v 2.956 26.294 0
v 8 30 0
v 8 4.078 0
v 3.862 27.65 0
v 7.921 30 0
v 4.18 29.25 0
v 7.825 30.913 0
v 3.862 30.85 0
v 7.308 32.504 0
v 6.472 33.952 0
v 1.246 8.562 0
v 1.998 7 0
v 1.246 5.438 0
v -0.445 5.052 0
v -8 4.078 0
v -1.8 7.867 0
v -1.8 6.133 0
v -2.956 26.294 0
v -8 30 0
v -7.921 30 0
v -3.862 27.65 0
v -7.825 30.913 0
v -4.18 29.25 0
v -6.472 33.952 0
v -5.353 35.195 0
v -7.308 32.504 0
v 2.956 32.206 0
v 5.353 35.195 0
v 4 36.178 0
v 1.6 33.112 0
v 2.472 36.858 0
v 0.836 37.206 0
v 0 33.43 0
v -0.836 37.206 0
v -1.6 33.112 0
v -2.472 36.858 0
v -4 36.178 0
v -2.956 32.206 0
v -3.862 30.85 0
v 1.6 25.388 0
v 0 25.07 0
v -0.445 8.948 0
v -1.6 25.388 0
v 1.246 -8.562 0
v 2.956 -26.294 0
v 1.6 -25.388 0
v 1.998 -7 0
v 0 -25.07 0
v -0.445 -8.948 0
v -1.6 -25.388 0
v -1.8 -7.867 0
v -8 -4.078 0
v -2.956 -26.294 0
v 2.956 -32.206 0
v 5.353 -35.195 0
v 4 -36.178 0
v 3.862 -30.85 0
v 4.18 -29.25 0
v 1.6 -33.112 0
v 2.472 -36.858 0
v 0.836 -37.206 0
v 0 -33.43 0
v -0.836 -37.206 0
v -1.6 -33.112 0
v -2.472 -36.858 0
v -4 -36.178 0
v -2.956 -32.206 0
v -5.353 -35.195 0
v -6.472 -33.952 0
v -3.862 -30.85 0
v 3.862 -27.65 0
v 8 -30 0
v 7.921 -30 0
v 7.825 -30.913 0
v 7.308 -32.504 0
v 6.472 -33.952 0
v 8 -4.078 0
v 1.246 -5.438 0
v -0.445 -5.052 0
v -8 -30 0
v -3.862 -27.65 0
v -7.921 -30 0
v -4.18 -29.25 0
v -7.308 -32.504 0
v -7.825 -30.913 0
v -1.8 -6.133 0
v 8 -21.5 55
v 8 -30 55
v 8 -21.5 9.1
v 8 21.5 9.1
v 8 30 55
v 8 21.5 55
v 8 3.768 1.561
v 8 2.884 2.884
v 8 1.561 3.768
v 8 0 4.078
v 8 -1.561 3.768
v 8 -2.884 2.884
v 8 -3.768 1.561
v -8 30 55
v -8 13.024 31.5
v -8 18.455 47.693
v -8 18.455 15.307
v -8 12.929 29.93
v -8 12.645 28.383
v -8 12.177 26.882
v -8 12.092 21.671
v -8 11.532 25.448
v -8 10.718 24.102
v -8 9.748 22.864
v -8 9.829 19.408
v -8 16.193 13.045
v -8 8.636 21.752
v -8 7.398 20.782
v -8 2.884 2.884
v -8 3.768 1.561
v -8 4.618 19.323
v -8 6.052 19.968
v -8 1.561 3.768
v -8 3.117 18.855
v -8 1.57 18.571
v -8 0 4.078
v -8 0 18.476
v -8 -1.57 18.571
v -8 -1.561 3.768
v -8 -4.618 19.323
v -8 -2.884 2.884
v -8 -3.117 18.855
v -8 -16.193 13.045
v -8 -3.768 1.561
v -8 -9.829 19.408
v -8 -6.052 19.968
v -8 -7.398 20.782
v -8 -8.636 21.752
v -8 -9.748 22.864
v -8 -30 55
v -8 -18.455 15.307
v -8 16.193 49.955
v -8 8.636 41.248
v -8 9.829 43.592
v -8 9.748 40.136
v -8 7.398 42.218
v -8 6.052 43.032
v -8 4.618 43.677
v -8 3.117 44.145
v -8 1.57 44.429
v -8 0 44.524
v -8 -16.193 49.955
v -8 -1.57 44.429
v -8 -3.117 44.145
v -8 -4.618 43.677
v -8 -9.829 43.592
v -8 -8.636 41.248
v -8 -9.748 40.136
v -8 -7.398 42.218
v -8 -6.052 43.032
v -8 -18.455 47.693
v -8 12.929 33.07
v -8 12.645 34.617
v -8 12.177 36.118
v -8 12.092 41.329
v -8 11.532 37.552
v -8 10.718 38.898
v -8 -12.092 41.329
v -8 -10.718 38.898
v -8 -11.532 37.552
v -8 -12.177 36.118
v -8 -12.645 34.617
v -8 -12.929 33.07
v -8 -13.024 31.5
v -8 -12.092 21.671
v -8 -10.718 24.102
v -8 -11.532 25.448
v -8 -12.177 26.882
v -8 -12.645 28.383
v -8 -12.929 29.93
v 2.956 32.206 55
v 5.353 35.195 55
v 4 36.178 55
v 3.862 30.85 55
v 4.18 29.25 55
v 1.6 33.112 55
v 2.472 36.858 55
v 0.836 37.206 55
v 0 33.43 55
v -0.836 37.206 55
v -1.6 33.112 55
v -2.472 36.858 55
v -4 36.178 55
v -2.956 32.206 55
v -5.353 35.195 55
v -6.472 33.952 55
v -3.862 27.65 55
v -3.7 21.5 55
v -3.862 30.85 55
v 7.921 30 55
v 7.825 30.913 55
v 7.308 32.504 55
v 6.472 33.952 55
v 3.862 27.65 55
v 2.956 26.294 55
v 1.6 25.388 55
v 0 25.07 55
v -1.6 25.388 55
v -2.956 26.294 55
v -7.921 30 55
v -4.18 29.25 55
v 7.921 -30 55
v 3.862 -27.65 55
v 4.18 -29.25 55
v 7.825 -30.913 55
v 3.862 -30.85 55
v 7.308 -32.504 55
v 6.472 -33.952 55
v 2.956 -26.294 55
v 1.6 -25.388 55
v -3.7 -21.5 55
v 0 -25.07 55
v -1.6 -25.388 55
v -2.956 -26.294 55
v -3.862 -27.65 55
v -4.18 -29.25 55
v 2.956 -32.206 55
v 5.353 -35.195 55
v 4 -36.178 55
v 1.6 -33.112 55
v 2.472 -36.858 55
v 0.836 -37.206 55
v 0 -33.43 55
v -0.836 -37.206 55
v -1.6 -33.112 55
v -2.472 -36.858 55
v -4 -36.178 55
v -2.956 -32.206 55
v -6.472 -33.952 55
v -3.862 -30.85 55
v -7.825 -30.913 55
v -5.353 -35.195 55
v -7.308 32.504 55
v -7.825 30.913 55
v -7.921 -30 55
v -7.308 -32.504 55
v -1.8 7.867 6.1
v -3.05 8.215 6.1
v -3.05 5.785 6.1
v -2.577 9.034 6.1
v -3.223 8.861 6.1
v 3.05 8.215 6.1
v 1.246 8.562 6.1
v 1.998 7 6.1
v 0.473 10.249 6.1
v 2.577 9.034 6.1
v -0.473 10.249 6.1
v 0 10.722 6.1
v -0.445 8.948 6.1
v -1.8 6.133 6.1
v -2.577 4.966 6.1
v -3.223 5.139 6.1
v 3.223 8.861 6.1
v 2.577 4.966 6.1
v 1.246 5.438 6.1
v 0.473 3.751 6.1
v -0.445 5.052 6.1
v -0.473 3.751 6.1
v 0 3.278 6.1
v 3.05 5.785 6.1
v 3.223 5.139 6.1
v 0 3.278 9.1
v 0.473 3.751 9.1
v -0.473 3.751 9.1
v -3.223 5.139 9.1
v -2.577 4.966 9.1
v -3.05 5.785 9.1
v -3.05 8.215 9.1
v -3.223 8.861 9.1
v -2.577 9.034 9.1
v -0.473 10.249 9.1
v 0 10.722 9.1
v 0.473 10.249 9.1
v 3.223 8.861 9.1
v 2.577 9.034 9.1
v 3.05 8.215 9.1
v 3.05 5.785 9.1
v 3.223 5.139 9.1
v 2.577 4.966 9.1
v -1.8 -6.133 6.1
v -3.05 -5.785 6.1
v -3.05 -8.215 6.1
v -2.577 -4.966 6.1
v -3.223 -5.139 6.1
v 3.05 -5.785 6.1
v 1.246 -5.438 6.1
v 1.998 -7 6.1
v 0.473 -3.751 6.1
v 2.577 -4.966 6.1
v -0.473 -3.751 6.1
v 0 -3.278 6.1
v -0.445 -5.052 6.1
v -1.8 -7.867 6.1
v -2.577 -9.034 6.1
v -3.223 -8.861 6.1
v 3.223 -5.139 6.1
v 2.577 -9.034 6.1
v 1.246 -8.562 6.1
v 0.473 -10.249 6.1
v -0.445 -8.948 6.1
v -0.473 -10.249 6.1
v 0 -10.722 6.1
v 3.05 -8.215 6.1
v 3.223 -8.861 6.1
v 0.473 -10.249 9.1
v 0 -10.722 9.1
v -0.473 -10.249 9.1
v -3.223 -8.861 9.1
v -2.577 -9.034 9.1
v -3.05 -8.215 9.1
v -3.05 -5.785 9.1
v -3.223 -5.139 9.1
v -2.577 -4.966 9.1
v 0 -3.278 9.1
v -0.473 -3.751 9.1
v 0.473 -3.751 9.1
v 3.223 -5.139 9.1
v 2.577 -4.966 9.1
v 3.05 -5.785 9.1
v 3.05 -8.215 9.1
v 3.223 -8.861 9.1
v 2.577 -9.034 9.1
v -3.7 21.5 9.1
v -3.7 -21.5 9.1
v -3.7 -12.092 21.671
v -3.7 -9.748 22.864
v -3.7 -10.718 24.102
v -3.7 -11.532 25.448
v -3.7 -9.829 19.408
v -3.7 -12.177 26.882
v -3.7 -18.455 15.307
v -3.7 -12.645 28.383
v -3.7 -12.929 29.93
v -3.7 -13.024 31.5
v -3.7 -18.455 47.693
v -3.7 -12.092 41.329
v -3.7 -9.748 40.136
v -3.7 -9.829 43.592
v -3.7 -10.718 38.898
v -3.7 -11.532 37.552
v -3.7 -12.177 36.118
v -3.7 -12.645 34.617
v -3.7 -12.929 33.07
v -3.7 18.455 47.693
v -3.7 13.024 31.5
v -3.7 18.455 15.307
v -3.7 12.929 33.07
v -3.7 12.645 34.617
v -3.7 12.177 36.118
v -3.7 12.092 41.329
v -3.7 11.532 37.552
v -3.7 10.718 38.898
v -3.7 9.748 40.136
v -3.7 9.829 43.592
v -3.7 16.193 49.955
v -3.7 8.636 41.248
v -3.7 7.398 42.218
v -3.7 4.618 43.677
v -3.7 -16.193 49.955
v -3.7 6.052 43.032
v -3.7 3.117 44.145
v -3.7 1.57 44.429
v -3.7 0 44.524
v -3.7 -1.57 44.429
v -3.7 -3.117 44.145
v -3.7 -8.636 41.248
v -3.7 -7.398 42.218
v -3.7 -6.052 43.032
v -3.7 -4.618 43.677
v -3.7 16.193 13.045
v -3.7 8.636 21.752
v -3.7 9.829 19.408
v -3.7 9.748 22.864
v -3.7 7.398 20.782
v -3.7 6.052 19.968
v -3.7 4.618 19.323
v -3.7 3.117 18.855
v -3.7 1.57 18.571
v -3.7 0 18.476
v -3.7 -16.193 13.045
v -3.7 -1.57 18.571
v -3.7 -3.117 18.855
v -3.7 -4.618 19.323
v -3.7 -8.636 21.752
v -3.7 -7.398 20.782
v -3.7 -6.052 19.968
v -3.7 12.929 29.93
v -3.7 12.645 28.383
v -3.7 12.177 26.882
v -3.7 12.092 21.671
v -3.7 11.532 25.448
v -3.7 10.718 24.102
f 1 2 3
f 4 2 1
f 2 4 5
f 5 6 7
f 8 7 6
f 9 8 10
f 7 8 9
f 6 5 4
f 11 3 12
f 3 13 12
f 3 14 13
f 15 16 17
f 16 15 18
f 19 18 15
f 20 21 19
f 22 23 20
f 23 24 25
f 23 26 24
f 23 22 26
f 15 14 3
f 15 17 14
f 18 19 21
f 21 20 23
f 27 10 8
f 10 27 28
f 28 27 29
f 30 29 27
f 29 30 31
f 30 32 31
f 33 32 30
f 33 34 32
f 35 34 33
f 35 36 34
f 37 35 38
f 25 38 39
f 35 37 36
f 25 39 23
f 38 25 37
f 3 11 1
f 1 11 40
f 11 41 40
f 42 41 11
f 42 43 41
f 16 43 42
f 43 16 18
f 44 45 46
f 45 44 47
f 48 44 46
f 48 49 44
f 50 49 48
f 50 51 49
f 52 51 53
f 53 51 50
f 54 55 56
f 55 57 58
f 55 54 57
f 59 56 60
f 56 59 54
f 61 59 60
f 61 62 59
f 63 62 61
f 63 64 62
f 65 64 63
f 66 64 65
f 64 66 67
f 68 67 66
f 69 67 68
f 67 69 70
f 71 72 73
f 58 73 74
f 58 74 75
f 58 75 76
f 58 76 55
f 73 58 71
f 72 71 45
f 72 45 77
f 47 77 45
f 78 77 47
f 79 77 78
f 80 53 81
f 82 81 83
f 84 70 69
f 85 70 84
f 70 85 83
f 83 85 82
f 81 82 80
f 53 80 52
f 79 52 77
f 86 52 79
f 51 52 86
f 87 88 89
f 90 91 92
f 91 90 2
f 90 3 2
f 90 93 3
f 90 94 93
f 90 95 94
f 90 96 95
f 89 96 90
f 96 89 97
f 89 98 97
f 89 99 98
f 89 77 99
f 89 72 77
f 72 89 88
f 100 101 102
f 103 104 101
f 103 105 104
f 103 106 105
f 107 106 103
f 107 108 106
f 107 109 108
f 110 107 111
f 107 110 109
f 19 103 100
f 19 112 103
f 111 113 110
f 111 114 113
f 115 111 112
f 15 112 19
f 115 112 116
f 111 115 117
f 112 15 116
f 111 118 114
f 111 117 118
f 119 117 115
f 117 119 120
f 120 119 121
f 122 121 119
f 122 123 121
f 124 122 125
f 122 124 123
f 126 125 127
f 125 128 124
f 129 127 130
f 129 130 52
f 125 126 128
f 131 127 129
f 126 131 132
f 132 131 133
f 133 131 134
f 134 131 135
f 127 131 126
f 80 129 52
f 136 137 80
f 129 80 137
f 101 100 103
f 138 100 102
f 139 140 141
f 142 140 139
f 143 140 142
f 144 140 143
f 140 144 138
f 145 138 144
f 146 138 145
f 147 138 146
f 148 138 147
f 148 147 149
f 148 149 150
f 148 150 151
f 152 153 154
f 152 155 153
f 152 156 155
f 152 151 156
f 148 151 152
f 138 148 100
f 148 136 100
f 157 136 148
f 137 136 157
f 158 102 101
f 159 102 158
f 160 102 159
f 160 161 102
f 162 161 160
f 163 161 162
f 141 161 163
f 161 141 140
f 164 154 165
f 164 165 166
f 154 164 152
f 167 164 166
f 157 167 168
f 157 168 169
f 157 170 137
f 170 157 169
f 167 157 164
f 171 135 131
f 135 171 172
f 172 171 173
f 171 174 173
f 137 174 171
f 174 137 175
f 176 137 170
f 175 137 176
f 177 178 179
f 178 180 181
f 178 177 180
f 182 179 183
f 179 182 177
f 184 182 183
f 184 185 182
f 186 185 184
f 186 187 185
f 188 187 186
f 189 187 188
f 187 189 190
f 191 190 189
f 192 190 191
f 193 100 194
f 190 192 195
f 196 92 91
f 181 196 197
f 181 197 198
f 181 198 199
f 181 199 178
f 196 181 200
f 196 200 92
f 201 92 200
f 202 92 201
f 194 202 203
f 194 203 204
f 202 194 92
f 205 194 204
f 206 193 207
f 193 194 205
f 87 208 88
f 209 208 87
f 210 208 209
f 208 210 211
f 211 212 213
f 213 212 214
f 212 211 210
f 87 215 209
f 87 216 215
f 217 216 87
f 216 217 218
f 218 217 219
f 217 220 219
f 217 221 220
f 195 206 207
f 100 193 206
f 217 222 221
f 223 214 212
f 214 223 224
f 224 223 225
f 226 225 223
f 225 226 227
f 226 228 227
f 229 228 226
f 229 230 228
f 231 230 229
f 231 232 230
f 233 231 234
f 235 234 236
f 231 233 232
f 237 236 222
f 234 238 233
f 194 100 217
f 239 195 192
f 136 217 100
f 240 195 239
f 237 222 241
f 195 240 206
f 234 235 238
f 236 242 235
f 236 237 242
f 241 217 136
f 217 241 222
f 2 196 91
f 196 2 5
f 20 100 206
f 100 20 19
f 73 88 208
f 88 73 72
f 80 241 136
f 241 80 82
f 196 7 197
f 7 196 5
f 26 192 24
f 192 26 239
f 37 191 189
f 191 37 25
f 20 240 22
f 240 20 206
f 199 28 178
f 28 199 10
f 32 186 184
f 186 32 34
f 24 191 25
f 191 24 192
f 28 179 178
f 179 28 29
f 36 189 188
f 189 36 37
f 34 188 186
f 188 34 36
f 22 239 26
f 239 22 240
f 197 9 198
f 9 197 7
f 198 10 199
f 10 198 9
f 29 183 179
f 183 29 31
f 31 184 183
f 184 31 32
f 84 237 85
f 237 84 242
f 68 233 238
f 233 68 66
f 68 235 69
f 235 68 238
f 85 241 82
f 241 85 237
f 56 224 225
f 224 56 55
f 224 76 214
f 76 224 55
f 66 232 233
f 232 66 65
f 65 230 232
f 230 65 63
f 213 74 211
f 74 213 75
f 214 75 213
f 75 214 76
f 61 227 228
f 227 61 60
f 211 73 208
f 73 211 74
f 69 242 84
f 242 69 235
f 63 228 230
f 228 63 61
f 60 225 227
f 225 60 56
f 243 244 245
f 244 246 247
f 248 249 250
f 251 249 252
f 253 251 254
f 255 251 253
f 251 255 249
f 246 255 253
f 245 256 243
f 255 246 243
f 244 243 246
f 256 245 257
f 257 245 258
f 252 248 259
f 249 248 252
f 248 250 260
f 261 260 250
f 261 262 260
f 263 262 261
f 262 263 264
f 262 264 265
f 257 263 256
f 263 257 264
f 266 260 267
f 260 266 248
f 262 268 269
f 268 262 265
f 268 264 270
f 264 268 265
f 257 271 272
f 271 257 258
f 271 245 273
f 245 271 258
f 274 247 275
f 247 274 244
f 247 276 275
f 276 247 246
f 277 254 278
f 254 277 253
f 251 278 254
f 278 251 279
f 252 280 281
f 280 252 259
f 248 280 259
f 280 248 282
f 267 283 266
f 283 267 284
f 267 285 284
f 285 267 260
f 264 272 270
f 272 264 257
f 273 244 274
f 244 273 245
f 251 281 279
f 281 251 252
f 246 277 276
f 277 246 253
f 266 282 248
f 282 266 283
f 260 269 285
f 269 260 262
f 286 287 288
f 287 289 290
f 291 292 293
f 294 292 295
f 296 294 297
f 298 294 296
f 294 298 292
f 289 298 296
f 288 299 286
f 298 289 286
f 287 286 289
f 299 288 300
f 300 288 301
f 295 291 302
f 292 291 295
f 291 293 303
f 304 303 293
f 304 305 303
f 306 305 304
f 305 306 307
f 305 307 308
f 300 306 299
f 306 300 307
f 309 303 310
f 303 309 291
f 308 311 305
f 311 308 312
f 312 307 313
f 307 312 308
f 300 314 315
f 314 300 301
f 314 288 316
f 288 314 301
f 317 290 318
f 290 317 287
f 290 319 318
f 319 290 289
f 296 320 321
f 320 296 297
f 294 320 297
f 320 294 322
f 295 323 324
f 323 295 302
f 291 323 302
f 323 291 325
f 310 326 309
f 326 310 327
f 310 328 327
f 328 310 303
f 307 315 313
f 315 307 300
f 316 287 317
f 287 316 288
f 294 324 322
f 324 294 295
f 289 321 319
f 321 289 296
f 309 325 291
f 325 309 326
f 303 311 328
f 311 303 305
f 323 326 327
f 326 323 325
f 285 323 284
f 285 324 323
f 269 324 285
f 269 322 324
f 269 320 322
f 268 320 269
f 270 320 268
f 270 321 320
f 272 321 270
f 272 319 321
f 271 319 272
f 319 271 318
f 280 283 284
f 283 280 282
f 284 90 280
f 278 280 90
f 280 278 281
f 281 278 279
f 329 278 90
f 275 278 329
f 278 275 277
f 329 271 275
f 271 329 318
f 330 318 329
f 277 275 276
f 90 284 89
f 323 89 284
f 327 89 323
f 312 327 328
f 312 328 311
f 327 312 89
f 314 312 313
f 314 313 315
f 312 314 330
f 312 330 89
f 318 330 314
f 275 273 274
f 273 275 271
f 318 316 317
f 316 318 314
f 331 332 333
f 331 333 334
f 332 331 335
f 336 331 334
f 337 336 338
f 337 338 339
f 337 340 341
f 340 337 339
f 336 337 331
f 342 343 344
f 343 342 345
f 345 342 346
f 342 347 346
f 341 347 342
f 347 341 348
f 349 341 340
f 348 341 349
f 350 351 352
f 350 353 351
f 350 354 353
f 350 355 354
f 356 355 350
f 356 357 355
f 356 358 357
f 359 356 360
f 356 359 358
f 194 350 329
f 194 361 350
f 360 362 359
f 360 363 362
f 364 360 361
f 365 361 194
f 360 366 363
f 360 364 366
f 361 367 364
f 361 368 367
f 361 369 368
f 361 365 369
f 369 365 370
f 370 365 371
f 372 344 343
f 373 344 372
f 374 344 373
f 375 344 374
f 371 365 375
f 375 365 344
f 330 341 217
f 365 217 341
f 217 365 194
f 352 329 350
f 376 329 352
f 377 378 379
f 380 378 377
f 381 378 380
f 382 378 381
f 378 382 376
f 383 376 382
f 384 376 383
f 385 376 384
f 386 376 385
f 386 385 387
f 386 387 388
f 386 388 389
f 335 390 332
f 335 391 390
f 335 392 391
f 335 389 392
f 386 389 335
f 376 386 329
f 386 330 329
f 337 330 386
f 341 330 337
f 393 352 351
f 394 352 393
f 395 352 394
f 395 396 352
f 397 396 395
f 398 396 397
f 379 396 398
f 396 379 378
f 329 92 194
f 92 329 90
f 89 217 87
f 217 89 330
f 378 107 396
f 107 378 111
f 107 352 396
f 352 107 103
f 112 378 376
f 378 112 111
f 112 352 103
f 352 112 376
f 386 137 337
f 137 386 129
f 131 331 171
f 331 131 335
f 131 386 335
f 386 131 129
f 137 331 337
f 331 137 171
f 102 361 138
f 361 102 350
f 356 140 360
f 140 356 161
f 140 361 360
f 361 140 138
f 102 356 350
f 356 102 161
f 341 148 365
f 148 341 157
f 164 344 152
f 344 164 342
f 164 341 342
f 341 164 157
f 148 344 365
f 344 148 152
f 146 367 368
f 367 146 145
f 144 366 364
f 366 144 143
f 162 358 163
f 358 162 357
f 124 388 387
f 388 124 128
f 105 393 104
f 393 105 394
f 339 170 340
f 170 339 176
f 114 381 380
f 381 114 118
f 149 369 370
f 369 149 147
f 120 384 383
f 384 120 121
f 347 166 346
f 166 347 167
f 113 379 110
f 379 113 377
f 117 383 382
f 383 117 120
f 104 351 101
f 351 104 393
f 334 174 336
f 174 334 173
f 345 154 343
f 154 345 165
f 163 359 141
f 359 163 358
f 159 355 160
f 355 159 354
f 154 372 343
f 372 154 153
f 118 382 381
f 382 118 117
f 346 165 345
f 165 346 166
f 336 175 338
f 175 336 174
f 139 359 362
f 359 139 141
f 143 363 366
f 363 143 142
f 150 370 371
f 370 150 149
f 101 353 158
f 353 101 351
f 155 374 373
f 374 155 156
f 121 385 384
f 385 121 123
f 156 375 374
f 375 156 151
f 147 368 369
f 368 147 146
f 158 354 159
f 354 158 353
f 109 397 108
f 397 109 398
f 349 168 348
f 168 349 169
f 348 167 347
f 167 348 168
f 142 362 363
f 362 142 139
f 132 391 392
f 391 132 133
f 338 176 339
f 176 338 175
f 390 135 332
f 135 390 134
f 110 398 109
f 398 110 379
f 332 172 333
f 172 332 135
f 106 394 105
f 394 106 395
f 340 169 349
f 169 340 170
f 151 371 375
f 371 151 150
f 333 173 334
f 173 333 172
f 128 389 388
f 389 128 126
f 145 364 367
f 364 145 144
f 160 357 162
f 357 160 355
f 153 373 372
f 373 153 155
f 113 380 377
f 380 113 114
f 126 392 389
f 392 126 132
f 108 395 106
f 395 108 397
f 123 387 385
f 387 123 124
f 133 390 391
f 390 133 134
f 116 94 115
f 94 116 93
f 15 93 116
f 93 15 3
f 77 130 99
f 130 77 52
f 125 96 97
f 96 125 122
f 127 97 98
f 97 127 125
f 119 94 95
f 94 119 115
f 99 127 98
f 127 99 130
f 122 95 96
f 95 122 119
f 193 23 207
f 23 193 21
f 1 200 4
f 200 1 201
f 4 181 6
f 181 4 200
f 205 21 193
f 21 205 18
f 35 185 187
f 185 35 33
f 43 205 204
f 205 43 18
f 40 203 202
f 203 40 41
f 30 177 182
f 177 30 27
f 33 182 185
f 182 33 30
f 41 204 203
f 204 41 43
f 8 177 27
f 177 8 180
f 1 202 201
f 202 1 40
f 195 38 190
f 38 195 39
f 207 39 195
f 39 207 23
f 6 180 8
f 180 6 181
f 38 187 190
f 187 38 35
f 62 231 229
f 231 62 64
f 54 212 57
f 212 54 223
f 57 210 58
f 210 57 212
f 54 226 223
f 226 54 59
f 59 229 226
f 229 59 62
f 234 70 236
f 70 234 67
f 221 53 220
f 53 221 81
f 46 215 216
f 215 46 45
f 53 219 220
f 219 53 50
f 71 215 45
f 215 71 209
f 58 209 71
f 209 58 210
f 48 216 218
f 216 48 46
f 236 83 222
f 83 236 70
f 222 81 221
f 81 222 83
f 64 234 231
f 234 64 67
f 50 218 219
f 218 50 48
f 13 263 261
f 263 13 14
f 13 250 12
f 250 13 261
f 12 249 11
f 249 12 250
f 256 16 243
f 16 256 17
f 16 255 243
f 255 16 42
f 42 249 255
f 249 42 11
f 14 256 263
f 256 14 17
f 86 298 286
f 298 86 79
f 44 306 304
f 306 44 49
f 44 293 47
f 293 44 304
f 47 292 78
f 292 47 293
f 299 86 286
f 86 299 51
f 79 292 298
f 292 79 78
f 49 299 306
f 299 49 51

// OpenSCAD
// file: functions.scad
// PRUSA Mendel  
// Functions used in many files
// GNU GPL v2
// Josef Průša
// josefprusa@me.com
// prusadjs.cz
// http://www.reprap.org/wiki/Prusa_Mendel
// http://github.com/prusajr/PrusaMendel

module nut( d, h, horizontal = true )
{
	cornerradius = nutcornerdiameter(d)/2;
	cylinder( h = h, r = cornerradius, $fn = 6 );
	if( horizontal )
	{
		for( i = [1 : 6] )
		{
			rotate( [0, 0, 60 * i] ) translate( [-cornerradius - 0.2, 0, 0] ) rotate( [0, 0, -45] ) cube( size = [2, 2, h] );
		}
	}
}

// By nophead
module polyhole( d, h ) 
{
	n = max( round( 2 * d ), 3 );
	rotate( [0, 0, 180] ) cylinder( h = h, r = ( d / 2 ) / cos( 180 / n ), $fn = n );
}

module roundcorner( diameter )
{
	difference()
	{
		cube( size = [diameter, diameter, 99], center = false );
		translate( v = [diameter, diameter, 0] ) cylinder( h = 100, r = diameter, center = true );
	}
}

function nutcornerdiameter(d) = ( d ) / cos( 180 / 6 );
// file: metric.scad
// PRUSA Mendel  
// Default metric sizes
// GNU GPL v2
// Josef Průša
// josefprusa@me.com
// prusadjs.cz
// http://www.reprap.org/wiki/Prusa_Mendel
// http://github.com/prusajr/PrusaMendel

// DONT CHANGE THIS FILE! ALTER VALUES IN CONFIGURATION.SCAD INSTEAD

// RODS

threaded_rod_diameter = 8.2;
threaded_rod_diameter_horizontal = 8.2;
smooth_bar_diameter = 8;
smooth_bar_diameter_horizontal = 8.5;

// Nuts and bolts

m8_diameter = 9;
m8_nut_diameter = 16.4;

m4_diameter = 4.5;
m4_nut_diameter = 9;

m3_diameter = 3.6;
m3_nut_diameter = 6.1;

// Bushing holder

bushing_core_diameter = smooth_bar_diameter;
bushing_material_thickness = 1;

// Motors

motor_shaft = 5.5;
// file: configuration.scad
// PRUSA Mendel  
// Configuration file
// GNU GPL v2
// Josef Průša
// josefprusa@me.com
// prusadjs.cz
// http://www.reprap.org/wiki/Prusa_Mendel
// http://github.com/prusajr/PrusaMendel

// PLEASE SELECT ONE OF THE CONFIGURATIONS BELOW
// BY UN-COMMENTING IT

// Uncomment for metric settings
// METRIC METRIC METRIC METRIC METRIC METRIC METRIC METRIC 

include <metric.scad>;

// Uncomment for imperial settings
// IMPERIAL IMPERIAL IMPERIAL IMPERIAL IMPERIAL IMPERIAL IMPERIAL 

//include <sae.scad>;

// CUSTOM CUSTOM CUSTOM CUSTOM CUSTOM CUSTOM CUSTOM CUSTOM CUSTOM

// Thin walls
layer_height = 0.3;
wot = 1.5;
filament_width = layer_height * wot;

thin_wall = 4 * layer_height * wot;

// LM8UU
linear = true;
linear_bearing_diameter = 15;
linear_bearing_length = 24;

//608 bearing
bearing_diameter = 22;
bearing_thickness = 7;

//Timing belt
belt_pitch = 5;

// CHANGE ONLY THE STUFF YOU KNOW
// IT WILL REPLACE DEFAULT SETTING

// RODS

// threaded_rod_diameter = 0;
// threaded_rod_diameter_horizontal = 0;
// smooth_bar_díameter = 0;
// smooth_bar_díameter_horizontal = 0;

// Nuts and bolts

// m8_diameter = 0;
// m8_nut_diameter = 0;
// m8_nut_thickness = 0;

// m4_diameter = 0;
 m4_nut_diameter = 8.5;
// m4_nut_thickness = 0;

// m3_diameter = 0;
// m3_nut_diameter = 0;
m3_nut_thickness = 3;

// Bushing holder

// bushing_core_diameter = smooth_bar_díameter;
// bushing_material_thickness = 0;

///counted stuff
m3_nut_diameter_bigger = ( ( m3_nut_diameter  / 2) / cos( 180 / 6 ) ) * 2;

// functions 
include <functions.scad>
// main file
// PRUSA Mendel  
// Z motor mount
// Used for mounting Z motors
// GNU GPL v2
// Josef Průša
// josefprusa@me.com
// prusadjs.cz
// http://www.reprap.org/wiki/Prusa_Mendel
// http://github.com/prusajr/PrusaMendel
include <configuration.scad>

/**
 * @id z-motor-mount
 * @name Z motor mount
 * @category Printed
 * @using 2 m3x25xhex
 * @using 2 m3nut
 * @using 2 m3washer
 * @using 4 m8nut
 * @using 4 m8washer
 * @using 1 rod-clamp
 */

z_rod_leadscrew_spacing=31.5;
alignment_fix=z_rod_leadscrew_spacing-30;

module zmotormount()
{
	translate(v=[0,0,30+alignment_fix]) rotate ([0,90,0])
	difference()
	{
		union()
		{
			translate(v=[2.5+alignment_fix,0,0]) cube(size = [55,60,16], center = true);
			translate(v=[2.5+alignment_fix,0,-4]) cube(size = [55,74.5-16,8], center = true);
			translate(v=[-25+alignment_fix,29.25,0]) rotate(a=[0,90,0]) cylinder(h = 55, r=8, $fn=30);
			translate(v=[-25+alignment_fix,-29.25,0]) rotate(a=[0,90,0]) cylinder(h = 55, r=8, $fn=30);
		}
		translate(v=[-2.1+alignment_fix,0,2.8]) cube(size = [46,43,13], center = true);

/*		// reducing the material
		translate(v=[10.5-2.5+alignment_fix,34.5,-4]) cube(size = [25,20,30], center = true);
		translate(v=[10.5-2.5+alignment_fix,-34.5,-4]) cube(size = [25,20,30], center = true);
		translate(v=[-10+alignment_fix,0,0]) translate(v=[5.5,24.5,-10]) rotate(a=[0,0,45]) cube(size = [20,20,30]);
		translate(v=[-10+alignment_fix,0,0]) translate(v=[5.5,-24.5,-10]) rotate(a=[0,0,225]) cube(size = [20,20,30]);
*/
		// Nema 17
		rotate ([0,0,45]) translate([20,0,0]) cube(size = [9,3.2,25], center = true);
		rotate ([0,0,-45]) translate([20,0,0]) cube(size = [9,3.2,25], center = true);
		rotate ([0,0,135]) translate([20,0,0]) cube(size = [9,3.2,25], center = true);
		rotate ([0,0,-135]) translate([20,0,0]) cube(size = [9,3.2,25], center = true);
		translate(v=[0,0,-10])polyhole(26,20);

		translate(v=[30+alignment_fix,0,-10]) polyhole(h = 20, d=smooth_bar_diameter);
		translate(v=[-26+alignment_fix,29.25,0]) rotate(a=[0,90,0]) polyhole(h = 58, d=threaded_rod_diameter);
		translate(v=[-26+alignment_fix,-29.25,0]) rotate(a=[0,90,0]) polyhole(h = 58, d=threaded_rod_diameter);


		translate(v=[16+alignment_fix,7,0]) rotate(a=[0,90,0]) polyhole(m3_diameter,15);
		translate(v=[16+alignment_fix,-7,0]) rotate(a=[0,90,0]) polyhole(m3_diameter,15);
		translate(v=[-2.1+alignment_fix+m3_nut_thickness,7,0]) rotate(a=[0,90,0]) rotate(a=[0,0,30]) nut(m3_nut_diameter, 23, true);
		translate(v=[-2.1+alignment_fix+m3_nut_thickness,-7,0]) rotate(a=[0,90,0]) rotate(a=[0,0,30]) nut(m3_nut_diameter, 23, true);

	}
}

 
zmotormount();
